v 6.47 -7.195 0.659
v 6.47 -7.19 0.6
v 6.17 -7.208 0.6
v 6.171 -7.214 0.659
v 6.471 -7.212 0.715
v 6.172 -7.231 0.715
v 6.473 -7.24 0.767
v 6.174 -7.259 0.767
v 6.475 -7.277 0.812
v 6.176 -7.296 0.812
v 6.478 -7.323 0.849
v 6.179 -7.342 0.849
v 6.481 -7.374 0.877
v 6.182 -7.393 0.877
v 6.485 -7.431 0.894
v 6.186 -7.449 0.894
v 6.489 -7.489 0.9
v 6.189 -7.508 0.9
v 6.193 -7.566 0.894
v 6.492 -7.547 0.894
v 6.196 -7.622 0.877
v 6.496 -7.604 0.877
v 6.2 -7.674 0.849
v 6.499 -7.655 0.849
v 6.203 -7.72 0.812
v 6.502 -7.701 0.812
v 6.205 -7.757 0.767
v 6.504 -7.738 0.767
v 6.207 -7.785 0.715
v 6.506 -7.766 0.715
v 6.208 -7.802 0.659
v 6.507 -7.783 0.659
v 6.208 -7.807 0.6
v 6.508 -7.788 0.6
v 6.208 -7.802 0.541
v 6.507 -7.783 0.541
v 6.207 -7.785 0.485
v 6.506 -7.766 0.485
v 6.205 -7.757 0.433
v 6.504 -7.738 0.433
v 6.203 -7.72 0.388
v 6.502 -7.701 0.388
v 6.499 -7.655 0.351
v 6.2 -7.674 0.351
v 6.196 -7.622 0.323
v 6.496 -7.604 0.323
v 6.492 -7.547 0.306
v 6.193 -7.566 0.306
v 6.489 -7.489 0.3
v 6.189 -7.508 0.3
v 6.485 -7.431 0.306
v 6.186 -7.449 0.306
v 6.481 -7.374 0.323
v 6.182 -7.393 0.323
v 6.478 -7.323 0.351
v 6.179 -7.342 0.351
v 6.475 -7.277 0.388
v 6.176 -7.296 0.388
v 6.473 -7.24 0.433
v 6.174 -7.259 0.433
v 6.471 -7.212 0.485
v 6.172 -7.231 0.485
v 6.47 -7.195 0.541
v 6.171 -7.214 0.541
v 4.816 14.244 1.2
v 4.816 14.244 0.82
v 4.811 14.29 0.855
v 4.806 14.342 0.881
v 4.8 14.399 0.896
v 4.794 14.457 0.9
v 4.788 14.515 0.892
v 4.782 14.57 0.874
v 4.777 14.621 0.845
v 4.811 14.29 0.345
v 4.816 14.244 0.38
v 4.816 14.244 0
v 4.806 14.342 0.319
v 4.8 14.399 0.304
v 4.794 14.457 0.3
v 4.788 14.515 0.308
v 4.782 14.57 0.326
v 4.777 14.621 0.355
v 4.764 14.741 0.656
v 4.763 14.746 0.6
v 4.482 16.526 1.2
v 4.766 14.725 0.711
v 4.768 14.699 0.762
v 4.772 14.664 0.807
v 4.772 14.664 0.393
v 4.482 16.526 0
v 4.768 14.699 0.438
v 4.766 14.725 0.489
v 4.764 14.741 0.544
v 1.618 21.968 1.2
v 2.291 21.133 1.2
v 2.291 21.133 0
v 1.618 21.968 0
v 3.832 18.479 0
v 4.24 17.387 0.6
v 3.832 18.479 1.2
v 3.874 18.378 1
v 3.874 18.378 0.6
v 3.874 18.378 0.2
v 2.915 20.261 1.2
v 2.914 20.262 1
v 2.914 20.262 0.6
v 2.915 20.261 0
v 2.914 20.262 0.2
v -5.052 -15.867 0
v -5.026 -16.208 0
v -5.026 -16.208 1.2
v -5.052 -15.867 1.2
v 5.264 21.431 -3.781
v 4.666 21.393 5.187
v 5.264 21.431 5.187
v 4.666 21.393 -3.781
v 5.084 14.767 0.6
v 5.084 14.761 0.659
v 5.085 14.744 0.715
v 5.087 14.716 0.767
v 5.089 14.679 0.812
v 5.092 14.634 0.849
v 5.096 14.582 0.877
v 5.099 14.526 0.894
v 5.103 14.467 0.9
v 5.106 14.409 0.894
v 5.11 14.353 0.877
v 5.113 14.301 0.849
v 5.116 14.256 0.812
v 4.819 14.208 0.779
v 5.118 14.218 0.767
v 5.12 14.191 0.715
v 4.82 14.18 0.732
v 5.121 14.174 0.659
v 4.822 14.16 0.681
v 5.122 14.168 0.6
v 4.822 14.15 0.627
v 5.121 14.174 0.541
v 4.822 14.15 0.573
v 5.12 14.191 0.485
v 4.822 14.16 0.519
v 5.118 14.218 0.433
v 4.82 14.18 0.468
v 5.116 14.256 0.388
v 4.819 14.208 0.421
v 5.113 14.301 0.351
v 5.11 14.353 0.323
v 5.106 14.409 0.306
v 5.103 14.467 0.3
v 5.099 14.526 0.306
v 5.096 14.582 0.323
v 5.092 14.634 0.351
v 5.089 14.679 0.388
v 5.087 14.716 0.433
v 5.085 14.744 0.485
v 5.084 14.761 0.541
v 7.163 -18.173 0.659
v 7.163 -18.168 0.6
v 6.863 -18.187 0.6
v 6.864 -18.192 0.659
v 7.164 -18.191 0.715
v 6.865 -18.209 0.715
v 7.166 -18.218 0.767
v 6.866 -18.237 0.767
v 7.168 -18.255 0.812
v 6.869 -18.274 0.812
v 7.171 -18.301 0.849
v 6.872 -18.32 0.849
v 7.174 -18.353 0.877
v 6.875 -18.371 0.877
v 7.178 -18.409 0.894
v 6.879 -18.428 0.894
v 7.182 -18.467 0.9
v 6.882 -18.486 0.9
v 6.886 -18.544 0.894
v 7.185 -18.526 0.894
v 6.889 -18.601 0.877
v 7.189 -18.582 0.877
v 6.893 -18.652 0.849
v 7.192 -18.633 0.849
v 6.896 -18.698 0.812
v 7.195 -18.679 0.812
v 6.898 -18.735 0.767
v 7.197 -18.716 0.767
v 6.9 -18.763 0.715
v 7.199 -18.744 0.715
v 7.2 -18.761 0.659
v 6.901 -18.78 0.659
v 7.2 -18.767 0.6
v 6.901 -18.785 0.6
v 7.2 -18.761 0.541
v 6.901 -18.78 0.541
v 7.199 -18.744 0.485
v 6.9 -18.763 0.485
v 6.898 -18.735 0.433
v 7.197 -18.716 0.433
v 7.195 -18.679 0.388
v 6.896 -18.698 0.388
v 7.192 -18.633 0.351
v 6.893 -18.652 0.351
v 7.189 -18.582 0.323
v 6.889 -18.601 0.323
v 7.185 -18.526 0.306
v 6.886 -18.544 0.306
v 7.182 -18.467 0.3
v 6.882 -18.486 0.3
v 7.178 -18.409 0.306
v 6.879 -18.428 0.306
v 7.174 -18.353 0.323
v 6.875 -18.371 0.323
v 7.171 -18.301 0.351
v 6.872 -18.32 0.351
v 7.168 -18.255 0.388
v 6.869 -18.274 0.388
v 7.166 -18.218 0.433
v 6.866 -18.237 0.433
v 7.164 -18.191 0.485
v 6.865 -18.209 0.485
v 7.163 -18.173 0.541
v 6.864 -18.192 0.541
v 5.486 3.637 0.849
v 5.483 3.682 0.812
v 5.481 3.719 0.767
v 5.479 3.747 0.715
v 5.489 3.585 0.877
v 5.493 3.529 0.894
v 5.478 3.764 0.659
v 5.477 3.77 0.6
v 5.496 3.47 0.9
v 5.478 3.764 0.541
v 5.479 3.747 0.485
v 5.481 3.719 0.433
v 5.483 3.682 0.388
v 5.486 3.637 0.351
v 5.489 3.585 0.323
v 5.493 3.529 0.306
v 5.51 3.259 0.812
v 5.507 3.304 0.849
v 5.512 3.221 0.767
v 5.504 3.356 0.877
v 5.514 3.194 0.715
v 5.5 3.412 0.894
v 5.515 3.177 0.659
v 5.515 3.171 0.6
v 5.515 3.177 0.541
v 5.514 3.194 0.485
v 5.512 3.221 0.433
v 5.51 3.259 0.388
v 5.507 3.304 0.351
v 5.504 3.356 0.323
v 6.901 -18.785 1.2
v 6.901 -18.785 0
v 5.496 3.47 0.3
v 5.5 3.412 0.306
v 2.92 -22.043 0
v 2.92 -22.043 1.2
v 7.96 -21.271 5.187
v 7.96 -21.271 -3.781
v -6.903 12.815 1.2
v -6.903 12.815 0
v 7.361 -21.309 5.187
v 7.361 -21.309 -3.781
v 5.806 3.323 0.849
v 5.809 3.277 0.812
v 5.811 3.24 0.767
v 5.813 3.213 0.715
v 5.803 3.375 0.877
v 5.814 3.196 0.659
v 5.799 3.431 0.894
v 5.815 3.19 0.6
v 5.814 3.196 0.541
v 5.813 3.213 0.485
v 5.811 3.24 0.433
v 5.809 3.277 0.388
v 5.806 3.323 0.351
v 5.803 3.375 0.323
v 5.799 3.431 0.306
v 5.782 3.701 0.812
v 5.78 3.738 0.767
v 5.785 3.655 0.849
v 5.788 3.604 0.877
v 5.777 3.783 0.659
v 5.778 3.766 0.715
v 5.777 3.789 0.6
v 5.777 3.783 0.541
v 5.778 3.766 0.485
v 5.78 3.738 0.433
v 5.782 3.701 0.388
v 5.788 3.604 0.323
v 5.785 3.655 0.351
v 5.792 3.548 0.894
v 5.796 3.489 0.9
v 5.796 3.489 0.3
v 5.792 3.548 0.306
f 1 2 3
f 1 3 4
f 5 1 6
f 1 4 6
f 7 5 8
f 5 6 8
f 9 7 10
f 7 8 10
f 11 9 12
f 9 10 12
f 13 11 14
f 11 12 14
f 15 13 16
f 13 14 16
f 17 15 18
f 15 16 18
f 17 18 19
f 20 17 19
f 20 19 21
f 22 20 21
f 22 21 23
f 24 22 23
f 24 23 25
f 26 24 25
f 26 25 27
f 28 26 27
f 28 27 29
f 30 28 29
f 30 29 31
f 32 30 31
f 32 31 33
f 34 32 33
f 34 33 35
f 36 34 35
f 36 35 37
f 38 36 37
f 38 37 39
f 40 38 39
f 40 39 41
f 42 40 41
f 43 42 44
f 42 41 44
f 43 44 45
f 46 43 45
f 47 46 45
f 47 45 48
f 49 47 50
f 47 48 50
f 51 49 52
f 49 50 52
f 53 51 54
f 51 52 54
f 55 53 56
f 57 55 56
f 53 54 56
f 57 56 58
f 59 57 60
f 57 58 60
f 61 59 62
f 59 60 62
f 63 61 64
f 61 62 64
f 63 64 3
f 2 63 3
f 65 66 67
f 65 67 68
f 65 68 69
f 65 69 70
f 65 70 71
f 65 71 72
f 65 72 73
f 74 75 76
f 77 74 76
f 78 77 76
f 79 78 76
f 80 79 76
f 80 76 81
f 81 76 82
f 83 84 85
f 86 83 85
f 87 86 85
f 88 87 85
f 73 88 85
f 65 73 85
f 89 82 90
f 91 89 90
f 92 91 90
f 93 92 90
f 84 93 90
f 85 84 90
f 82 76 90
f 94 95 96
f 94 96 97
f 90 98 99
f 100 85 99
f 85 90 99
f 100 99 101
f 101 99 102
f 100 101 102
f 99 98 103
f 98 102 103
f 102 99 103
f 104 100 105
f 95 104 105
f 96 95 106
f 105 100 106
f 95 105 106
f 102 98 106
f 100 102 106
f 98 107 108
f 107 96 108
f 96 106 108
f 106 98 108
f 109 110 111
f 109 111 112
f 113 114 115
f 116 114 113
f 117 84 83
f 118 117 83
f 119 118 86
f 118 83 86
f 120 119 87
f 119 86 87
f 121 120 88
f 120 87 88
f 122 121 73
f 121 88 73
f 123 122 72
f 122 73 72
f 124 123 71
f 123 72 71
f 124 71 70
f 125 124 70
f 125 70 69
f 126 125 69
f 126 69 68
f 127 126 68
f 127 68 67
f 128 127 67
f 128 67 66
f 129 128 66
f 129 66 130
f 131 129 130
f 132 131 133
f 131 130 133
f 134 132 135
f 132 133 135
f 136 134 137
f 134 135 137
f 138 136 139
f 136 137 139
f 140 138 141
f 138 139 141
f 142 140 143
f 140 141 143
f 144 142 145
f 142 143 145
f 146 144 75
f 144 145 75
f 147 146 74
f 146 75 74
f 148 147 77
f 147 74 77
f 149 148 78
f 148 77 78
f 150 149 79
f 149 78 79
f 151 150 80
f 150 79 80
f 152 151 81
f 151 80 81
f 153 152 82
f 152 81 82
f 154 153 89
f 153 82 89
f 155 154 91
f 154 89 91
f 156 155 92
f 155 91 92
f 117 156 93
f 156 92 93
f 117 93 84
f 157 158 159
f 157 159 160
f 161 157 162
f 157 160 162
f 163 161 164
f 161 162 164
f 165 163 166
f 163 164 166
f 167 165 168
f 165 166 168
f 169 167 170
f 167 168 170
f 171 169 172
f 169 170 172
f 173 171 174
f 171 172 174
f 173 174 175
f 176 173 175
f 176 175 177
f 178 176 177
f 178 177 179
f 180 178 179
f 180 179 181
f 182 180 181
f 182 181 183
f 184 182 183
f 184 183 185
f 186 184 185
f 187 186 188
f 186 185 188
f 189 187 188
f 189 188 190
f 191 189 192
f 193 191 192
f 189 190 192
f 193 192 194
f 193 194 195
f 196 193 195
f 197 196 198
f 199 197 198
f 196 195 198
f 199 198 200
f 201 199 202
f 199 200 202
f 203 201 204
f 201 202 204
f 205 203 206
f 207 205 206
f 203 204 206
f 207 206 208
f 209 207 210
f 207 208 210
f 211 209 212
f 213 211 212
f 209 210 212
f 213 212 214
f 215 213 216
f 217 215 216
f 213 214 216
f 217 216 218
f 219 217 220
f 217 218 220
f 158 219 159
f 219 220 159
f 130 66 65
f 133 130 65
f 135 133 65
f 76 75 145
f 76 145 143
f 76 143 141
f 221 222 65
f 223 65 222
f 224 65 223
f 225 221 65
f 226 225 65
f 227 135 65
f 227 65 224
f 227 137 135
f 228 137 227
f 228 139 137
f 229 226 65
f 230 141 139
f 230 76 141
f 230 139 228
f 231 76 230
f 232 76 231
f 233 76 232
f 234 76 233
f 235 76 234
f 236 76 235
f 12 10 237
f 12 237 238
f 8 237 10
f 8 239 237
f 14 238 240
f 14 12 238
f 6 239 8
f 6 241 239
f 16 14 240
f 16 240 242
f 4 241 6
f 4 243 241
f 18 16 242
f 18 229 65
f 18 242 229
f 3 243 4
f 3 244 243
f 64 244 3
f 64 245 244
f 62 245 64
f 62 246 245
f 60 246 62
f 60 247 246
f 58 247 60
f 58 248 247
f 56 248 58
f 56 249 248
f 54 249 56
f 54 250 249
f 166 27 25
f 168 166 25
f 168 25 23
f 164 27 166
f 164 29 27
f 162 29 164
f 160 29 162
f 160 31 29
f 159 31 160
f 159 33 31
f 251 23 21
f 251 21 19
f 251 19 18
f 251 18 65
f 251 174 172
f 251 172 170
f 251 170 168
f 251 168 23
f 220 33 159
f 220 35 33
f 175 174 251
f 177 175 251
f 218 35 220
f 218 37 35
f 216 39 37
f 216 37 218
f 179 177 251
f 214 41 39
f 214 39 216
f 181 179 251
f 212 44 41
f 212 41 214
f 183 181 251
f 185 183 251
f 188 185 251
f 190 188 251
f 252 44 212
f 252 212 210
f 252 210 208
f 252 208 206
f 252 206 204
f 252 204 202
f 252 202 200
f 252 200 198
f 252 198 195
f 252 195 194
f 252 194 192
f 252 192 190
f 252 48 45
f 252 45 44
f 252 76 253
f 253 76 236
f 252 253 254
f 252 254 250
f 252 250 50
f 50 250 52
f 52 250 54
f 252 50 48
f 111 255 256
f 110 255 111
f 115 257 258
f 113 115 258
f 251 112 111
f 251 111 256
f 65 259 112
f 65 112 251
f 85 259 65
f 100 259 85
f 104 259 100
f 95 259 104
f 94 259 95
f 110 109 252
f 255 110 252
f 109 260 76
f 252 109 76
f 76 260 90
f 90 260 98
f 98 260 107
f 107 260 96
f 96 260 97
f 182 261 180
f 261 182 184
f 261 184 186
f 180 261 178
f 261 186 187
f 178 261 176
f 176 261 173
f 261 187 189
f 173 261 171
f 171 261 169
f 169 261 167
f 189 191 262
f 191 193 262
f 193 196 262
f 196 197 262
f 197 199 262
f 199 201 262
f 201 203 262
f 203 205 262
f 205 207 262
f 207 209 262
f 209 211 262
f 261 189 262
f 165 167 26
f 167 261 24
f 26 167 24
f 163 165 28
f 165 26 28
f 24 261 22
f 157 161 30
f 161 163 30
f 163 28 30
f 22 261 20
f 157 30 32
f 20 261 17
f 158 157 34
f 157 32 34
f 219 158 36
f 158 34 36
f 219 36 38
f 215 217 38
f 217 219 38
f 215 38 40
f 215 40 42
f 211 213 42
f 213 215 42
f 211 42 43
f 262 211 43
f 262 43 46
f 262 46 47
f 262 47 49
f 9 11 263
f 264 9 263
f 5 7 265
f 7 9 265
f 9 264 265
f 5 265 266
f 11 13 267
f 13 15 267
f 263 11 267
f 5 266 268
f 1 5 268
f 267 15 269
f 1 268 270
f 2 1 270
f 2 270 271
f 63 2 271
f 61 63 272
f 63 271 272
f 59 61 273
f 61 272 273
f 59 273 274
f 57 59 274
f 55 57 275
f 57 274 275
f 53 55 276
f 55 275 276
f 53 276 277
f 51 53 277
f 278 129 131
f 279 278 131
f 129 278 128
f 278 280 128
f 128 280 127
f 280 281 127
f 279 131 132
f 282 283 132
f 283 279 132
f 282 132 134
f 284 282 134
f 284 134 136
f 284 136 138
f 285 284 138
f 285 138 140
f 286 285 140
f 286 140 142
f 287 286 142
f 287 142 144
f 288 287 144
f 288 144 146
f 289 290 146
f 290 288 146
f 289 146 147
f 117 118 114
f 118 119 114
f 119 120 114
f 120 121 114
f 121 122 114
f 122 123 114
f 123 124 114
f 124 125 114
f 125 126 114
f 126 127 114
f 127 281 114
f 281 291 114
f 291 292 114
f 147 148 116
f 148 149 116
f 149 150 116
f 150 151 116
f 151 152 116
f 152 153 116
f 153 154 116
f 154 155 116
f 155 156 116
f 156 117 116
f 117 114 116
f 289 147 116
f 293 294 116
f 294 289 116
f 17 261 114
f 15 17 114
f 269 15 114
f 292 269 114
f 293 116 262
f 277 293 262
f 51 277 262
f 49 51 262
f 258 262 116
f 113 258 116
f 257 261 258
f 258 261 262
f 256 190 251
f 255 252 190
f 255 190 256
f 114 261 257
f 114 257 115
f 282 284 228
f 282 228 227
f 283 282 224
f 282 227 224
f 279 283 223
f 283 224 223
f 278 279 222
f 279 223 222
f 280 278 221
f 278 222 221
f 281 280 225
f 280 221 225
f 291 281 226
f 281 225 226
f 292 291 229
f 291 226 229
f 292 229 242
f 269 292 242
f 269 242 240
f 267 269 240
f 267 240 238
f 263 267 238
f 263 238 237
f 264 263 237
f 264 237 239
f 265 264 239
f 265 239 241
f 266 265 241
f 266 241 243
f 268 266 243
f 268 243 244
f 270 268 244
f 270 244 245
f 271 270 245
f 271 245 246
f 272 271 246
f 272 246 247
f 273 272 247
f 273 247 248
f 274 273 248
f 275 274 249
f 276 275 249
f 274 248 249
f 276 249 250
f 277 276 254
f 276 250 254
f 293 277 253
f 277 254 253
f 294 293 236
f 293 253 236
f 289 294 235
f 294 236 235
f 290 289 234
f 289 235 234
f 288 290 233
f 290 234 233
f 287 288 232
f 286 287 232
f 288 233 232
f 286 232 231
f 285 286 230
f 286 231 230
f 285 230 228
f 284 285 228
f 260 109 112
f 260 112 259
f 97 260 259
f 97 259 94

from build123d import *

# Parameters (mm, degrees)
EXTRUDE_1_DEPTH      = 1.2
CUT_EXTRUDE_START    = -1.2
CUT_EXTRUDE_1_DEPTH  = 1.2
EXTRUDE_2_DEPTH      = 0.3
EXTRUDE_2_DEPTH_BACK = 1.2
SKETCH_3_R           = 0.3
SKETCH_4_W           = 8.968131771
SKETCH_4_H           = 42.786888223
EXTRUDE_3_DEPTH      = 0.6


# Read off the part's stored shape, not the designer's step: Вырез-Вытянуть-Тонкостенный1
with BuildPart() as part:
    # Эскиз1 → Бобышка-Вытянуть1 (new body)
    with BuildSketch(Plane.XY):
        with BuildLine():
            Line((-5.411197125, -16.421197495), (2.932953168, -22.548932866))
            Line((2.932953168, -22.548932866), (7.313221262, -18.965077153))
            Line((7.313221262, -18.965077153), (5.214911567, 14.277588478))
            add(Edge.make_bspline(
                [(5.214911567, 14.277588478), (5.138438722, 15.014978004), (4.987374421, 16.471615759), (4.285048461, 18.555840063), (3.313335464, 20.541616369), (2.370787647, 21.6834935), (1.892587883, 22.262822595)],
                knots=[0, 0, 0, 0, 0.251767614, 0.497341227, 0.74497707, 1, 1, 1, 1], degree=3))
            Line((1.892587883, 22.262822595), (1.612438242, 22.548932866))
            Line((1.612438242, 22.548932866), (-7.313221262, 12.961413017))
            Line((-7.313221262, 12.961413017), (-5.451496049, -15.895327784))
            Line((-5.451496049, -15.895327784), (-5.411197125, -16.421197495))
        make_face()
    extrude(amount=EXTRUDE_1_DEPTH)

    # Вырез-Вытянуть-Тонкостенный1 outline → Вырез-Вытянуть-Тонкостенный1 (cut)
    with BuildSketch(Plane.XY.offset(1.2).offset(CUT_EXTRUDE_START)):
        with BuildLine():
            Line((7.313221262, -18.965077153), (5.214911567, 14.277588478))
            add(Edge.make_bspline(
                [(5.214911567, 14.277588478), (5.138438722, 15.014978004), (4.987374421, 16.471615759), (4.285048461, 18.555840063), (3.313335464, 20.541616369), (2.370787647, 21.6834935), (1.892587883, 22.262822595)],
                knots=[0, 0, 0, 0, 0.251767614, 0.497341227, 0.74497707, 1, 1, 1, 1], degree=3))
            Line((1.892587883, 22.262822595), (1.612438242, 22.548932866))
            Line((1.612438242, 22.548932866), (-7.313221262, 12.961413017))
            Line((-7.313221262, 12.961413017), (-5.451496049, -15.895327784))
            Line((-5.451496049, -15.895327784), (-5.411197125, -16.421197495))
            Line((-5.411197125, -16.421197495), (2.932953168, -22.548932866))
            Line((2.932953168, -22.548932866), (7.313221262, -18.965077153))
        make_face()
        with BuildLine():
            add(Edge.make_bspline(
                [(4.816213875, 14.244344904), (4.742720796, 14.952991901), (4.670057139, 15.661759974), (4.444177706, 16.707849761), (4.349214266, 17.051042697), (4.131298148, 17.722896385), (4.008075561, 18.052719847), (3.607234384, 19.028852016), (3.299546795, 19.66229506), (2.721200979, 20.562478072), (2.509851785, 20.852004475), (2.072144291, 21.416226224), (1.845069272, 21.691997878), (1.617672174, 21.967521187)],
                knots=[0, 0, 0, 0, 0.25, 0.25, 0.375, 0.375, 0.5, 0.5, 0.75, 0.75, 0.875, 0.875, 1, 1, 1, 1], degree=3))
            Line((4.816213875, 14.244344904), (6.901087174, -18.785453392))
            Line((6.901087174, -18.785453392), (2.919717459, -22.042937704))
            Line((2.919717459, -22.042937704), (-5.026399994, -16.2075077))
            Line((-5.026399994, -16.2075077), (-5.052481173, -15.867168531))
            Line((-5.052481173, -15.867168531), (-6.902948488, 12.81507484))
            Line((-6.902948488, 12.81507484), (1.617672174, 21.967521187))
        make_face(mode=Mode.SUBTRACT)
    extrude(amount=CUT_EXTRUDE_1_DEPTH, mode=Mode.SUBTRACT)

    # Эскиз3 → Бобышка-Вытянуть2 (add, two sides: drawn at the far end of the back side and taken through both)
    with BuildSketch(Plane(origin=(5.692649923, 0.359325653, 0), x_dir=(0, 0, -1), z_dir=(0.9980138039949711, 0.06299561123989302, 0)).offset(-EXTRUDE_2_DEPTH_BACK)):
        with Locations(Location((-0.6, -18.882880004, 0), (0, 0, 90))):
            Circle(SKETCH_3_R)
        with Locations(Location((-0.6, -7.882880004, 0), (0, 0, 90))):
            Circle(SKETCH_3_R)
        with Locations(Location((-0.6, 3.117119996, 0), (0, 0, 90))):
            Circle(SKETCH_3_R)
        with Locations(Location((-0.6, 14.117119996, 0), (0, 0, 90))):
            Circle(SKETCH_3_R)
    extrude(amount=EXTRUDE_2_DEPTH + EXTRUDE_2_DEPTH_BACK)

    # Эскиз4 → Бобышка-Вытянуть3 (add)
    with BuildSketch(Plane(origin=(5.992054064, 0.378224336, 0), x_dir=(0, 0, -1), z_dir=(0.9980138039949711, 0.06299561123989304, 0))):
        with Locations((-0.702688531, -0.337065509)):
            Rectangle(SKETCH_4_W, SKETCH_4_H)
    extrude(amount=EXTRUDE_3_DEPTH)


solid = part.part
